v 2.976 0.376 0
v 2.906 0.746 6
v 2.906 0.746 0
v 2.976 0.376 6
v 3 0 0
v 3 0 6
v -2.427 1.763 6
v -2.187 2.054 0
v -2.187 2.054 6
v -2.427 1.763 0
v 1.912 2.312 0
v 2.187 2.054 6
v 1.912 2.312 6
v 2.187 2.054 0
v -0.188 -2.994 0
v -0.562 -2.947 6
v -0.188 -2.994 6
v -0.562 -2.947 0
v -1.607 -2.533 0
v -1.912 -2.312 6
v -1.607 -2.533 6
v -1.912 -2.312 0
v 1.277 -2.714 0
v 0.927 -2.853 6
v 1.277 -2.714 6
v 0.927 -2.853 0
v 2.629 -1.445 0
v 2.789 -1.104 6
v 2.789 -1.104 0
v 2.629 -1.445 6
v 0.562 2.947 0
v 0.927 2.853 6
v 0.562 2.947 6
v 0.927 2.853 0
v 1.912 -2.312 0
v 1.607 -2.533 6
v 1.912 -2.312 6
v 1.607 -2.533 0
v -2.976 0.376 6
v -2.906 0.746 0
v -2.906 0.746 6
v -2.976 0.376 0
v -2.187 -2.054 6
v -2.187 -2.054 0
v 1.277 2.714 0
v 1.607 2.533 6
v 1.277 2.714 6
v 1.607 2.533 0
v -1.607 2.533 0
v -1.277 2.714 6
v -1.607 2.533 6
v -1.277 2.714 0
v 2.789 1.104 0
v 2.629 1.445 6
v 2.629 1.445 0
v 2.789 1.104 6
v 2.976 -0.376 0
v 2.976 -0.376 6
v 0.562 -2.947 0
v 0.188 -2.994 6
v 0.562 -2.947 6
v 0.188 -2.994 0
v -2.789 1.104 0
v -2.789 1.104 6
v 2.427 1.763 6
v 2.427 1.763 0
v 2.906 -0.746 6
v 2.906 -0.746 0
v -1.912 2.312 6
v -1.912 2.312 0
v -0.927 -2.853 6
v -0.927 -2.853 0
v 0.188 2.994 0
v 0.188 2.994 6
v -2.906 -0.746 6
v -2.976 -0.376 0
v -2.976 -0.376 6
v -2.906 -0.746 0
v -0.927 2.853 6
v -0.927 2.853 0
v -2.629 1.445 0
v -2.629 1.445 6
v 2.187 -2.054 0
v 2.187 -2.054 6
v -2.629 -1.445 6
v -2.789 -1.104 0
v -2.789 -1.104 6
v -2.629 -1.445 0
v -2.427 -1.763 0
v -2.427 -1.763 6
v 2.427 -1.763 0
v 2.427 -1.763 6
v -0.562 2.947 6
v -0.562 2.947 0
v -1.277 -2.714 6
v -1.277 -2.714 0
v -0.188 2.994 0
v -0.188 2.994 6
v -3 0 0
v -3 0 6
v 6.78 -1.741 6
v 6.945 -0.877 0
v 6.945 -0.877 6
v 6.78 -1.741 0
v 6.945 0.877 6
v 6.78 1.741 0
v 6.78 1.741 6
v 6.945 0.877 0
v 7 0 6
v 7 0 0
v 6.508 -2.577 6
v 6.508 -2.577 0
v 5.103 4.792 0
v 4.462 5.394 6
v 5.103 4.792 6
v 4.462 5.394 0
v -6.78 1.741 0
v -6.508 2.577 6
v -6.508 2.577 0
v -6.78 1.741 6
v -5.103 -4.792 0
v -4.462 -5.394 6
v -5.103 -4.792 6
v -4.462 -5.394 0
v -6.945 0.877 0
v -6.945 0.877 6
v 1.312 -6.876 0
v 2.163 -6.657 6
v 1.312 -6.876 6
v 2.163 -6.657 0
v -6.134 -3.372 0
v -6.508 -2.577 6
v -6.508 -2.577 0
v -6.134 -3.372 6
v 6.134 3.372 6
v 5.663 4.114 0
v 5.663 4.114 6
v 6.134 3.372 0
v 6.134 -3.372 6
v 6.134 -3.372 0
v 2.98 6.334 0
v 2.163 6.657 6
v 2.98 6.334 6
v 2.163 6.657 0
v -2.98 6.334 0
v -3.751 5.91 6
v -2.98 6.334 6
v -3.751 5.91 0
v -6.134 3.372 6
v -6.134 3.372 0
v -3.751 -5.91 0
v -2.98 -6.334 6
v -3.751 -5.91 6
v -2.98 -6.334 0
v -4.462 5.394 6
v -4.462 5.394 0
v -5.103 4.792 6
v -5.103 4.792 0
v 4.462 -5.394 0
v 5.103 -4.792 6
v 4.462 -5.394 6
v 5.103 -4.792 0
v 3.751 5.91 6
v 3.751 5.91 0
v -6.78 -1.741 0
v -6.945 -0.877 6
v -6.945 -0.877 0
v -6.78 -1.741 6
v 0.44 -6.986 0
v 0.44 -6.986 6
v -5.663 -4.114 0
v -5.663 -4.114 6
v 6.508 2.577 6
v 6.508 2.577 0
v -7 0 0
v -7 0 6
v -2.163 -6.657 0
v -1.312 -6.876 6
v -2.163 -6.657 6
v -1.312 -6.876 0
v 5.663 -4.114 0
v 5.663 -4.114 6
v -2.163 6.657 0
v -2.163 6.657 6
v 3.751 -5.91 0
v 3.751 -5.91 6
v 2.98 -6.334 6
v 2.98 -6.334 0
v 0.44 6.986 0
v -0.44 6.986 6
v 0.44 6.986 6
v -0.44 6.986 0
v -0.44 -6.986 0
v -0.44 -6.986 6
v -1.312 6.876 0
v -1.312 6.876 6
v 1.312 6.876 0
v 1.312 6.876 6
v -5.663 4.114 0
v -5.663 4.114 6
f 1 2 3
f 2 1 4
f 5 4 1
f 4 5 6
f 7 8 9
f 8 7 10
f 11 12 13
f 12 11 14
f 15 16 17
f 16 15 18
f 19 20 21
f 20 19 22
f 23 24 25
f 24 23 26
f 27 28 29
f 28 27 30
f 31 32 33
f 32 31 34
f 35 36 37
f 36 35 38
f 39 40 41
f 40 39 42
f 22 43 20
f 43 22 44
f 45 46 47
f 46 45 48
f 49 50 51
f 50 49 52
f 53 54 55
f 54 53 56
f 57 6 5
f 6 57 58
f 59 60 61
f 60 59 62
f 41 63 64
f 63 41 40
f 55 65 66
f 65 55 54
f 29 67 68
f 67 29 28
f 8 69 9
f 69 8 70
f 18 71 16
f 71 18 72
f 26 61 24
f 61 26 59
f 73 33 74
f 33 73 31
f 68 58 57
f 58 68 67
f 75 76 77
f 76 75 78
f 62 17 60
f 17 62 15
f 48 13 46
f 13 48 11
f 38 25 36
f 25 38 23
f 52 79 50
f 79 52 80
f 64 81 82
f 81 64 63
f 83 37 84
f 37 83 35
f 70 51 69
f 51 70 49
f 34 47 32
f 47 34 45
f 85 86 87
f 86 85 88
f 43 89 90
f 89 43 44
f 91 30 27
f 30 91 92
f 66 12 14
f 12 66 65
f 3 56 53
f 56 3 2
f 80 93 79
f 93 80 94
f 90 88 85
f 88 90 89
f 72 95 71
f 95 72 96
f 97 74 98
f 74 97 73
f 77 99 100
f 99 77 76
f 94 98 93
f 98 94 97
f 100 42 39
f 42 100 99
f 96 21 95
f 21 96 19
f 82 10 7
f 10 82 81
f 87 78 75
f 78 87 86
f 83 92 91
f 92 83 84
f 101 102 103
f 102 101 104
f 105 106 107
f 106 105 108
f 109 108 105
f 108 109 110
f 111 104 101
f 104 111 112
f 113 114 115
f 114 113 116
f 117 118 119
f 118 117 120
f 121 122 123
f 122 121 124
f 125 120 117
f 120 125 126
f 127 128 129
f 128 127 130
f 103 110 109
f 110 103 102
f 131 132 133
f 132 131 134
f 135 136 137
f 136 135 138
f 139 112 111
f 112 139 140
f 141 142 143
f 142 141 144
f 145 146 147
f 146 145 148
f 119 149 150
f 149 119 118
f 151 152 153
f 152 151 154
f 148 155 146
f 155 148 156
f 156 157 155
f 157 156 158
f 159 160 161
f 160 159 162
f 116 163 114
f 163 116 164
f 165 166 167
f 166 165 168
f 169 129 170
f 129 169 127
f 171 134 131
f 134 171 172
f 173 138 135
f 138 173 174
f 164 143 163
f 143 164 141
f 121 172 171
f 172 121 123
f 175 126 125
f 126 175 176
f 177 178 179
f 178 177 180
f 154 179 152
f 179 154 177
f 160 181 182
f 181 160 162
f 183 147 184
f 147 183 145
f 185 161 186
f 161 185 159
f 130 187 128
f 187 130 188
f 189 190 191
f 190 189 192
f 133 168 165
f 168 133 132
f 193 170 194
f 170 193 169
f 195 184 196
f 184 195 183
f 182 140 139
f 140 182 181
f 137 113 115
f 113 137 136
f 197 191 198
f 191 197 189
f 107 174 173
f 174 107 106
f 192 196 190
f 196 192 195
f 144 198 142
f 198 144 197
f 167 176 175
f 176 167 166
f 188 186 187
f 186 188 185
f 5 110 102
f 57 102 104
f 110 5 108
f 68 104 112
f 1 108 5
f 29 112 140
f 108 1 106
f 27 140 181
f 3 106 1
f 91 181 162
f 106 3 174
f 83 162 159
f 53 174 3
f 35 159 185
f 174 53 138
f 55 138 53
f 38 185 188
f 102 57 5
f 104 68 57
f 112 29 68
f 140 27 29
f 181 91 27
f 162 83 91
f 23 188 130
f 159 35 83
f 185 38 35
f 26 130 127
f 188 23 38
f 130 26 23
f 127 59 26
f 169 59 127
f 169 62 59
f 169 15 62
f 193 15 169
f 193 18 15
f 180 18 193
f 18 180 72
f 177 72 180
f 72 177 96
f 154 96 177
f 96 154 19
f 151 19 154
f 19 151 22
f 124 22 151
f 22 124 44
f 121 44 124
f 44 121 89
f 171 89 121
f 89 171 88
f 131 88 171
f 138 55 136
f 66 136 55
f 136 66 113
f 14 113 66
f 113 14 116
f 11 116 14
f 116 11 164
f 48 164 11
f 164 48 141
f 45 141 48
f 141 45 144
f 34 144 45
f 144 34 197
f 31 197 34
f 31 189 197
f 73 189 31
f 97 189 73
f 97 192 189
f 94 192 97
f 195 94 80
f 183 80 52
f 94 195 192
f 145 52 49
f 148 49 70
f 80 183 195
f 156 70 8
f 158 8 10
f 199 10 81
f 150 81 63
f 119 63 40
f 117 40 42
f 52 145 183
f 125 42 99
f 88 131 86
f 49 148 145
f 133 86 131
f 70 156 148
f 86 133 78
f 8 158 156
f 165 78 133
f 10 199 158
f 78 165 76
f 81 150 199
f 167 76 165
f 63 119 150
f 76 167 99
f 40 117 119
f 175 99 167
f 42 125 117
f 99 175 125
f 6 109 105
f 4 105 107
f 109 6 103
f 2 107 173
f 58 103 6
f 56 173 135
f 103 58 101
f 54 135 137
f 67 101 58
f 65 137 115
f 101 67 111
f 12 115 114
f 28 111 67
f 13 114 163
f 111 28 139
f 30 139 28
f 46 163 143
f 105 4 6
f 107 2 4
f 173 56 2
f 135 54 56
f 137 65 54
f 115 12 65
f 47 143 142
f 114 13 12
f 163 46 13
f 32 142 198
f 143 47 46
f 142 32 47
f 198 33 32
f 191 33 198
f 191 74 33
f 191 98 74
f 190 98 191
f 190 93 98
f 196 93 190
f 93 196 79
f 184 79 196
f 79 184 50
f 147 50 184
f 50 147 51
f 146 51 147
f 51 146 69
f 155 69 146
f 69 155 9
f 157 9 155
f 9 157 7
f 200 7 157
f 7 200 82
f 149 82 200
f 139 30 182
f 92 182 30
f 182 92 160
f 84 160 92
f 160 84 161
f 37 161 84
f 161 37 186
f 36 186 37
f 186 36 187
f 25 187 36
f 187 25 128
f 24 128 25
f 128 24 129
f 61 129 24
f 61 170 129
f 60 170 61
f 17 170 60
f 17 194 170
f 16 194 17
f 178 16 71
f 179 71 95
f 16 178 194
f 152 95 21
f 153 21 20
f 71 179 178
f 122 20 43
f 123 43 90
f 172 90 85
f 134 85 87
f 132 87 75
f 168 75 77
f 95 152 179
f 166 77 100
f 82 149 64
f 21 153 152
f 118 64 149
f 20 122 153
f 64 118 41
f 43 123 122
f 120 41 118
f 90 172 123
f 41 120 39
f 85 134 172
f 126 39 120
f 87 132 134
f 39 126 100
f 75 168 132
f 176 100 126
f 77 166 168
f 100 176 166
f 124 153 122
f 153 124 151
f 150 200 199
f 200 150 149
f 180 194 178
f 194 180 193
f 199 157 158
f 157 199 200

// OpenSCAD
$fn = 50;


difference() {
	union() {
		cylinder(h = 6, r = 7.0000000000);
	}
	union() {
		#translate(v = [0.0000000000, 0.0000000000, -100.0000000000]) {
			cylinder(h = 200, r = 3.0000000000);
		}
		#translate(v = [0.0000000000, 0.0000000000, -100.0000000000]) {
			cylinder(h = 200, r = 3.0000000000);
		}
		#translate(v = [0.0000000000, 0.0000000000, -100.0000000000]) {
			cylinder(h = 200, r = 3.0000000000);
		}
		#translate(v = [0.0000000000, 0.0000000000, -100.0000000000]) {
			cylinder(h = 200, r = 3.0000000000);
		}
		#cylinder(h = 6, r = 3.0000000000);
	}
}
